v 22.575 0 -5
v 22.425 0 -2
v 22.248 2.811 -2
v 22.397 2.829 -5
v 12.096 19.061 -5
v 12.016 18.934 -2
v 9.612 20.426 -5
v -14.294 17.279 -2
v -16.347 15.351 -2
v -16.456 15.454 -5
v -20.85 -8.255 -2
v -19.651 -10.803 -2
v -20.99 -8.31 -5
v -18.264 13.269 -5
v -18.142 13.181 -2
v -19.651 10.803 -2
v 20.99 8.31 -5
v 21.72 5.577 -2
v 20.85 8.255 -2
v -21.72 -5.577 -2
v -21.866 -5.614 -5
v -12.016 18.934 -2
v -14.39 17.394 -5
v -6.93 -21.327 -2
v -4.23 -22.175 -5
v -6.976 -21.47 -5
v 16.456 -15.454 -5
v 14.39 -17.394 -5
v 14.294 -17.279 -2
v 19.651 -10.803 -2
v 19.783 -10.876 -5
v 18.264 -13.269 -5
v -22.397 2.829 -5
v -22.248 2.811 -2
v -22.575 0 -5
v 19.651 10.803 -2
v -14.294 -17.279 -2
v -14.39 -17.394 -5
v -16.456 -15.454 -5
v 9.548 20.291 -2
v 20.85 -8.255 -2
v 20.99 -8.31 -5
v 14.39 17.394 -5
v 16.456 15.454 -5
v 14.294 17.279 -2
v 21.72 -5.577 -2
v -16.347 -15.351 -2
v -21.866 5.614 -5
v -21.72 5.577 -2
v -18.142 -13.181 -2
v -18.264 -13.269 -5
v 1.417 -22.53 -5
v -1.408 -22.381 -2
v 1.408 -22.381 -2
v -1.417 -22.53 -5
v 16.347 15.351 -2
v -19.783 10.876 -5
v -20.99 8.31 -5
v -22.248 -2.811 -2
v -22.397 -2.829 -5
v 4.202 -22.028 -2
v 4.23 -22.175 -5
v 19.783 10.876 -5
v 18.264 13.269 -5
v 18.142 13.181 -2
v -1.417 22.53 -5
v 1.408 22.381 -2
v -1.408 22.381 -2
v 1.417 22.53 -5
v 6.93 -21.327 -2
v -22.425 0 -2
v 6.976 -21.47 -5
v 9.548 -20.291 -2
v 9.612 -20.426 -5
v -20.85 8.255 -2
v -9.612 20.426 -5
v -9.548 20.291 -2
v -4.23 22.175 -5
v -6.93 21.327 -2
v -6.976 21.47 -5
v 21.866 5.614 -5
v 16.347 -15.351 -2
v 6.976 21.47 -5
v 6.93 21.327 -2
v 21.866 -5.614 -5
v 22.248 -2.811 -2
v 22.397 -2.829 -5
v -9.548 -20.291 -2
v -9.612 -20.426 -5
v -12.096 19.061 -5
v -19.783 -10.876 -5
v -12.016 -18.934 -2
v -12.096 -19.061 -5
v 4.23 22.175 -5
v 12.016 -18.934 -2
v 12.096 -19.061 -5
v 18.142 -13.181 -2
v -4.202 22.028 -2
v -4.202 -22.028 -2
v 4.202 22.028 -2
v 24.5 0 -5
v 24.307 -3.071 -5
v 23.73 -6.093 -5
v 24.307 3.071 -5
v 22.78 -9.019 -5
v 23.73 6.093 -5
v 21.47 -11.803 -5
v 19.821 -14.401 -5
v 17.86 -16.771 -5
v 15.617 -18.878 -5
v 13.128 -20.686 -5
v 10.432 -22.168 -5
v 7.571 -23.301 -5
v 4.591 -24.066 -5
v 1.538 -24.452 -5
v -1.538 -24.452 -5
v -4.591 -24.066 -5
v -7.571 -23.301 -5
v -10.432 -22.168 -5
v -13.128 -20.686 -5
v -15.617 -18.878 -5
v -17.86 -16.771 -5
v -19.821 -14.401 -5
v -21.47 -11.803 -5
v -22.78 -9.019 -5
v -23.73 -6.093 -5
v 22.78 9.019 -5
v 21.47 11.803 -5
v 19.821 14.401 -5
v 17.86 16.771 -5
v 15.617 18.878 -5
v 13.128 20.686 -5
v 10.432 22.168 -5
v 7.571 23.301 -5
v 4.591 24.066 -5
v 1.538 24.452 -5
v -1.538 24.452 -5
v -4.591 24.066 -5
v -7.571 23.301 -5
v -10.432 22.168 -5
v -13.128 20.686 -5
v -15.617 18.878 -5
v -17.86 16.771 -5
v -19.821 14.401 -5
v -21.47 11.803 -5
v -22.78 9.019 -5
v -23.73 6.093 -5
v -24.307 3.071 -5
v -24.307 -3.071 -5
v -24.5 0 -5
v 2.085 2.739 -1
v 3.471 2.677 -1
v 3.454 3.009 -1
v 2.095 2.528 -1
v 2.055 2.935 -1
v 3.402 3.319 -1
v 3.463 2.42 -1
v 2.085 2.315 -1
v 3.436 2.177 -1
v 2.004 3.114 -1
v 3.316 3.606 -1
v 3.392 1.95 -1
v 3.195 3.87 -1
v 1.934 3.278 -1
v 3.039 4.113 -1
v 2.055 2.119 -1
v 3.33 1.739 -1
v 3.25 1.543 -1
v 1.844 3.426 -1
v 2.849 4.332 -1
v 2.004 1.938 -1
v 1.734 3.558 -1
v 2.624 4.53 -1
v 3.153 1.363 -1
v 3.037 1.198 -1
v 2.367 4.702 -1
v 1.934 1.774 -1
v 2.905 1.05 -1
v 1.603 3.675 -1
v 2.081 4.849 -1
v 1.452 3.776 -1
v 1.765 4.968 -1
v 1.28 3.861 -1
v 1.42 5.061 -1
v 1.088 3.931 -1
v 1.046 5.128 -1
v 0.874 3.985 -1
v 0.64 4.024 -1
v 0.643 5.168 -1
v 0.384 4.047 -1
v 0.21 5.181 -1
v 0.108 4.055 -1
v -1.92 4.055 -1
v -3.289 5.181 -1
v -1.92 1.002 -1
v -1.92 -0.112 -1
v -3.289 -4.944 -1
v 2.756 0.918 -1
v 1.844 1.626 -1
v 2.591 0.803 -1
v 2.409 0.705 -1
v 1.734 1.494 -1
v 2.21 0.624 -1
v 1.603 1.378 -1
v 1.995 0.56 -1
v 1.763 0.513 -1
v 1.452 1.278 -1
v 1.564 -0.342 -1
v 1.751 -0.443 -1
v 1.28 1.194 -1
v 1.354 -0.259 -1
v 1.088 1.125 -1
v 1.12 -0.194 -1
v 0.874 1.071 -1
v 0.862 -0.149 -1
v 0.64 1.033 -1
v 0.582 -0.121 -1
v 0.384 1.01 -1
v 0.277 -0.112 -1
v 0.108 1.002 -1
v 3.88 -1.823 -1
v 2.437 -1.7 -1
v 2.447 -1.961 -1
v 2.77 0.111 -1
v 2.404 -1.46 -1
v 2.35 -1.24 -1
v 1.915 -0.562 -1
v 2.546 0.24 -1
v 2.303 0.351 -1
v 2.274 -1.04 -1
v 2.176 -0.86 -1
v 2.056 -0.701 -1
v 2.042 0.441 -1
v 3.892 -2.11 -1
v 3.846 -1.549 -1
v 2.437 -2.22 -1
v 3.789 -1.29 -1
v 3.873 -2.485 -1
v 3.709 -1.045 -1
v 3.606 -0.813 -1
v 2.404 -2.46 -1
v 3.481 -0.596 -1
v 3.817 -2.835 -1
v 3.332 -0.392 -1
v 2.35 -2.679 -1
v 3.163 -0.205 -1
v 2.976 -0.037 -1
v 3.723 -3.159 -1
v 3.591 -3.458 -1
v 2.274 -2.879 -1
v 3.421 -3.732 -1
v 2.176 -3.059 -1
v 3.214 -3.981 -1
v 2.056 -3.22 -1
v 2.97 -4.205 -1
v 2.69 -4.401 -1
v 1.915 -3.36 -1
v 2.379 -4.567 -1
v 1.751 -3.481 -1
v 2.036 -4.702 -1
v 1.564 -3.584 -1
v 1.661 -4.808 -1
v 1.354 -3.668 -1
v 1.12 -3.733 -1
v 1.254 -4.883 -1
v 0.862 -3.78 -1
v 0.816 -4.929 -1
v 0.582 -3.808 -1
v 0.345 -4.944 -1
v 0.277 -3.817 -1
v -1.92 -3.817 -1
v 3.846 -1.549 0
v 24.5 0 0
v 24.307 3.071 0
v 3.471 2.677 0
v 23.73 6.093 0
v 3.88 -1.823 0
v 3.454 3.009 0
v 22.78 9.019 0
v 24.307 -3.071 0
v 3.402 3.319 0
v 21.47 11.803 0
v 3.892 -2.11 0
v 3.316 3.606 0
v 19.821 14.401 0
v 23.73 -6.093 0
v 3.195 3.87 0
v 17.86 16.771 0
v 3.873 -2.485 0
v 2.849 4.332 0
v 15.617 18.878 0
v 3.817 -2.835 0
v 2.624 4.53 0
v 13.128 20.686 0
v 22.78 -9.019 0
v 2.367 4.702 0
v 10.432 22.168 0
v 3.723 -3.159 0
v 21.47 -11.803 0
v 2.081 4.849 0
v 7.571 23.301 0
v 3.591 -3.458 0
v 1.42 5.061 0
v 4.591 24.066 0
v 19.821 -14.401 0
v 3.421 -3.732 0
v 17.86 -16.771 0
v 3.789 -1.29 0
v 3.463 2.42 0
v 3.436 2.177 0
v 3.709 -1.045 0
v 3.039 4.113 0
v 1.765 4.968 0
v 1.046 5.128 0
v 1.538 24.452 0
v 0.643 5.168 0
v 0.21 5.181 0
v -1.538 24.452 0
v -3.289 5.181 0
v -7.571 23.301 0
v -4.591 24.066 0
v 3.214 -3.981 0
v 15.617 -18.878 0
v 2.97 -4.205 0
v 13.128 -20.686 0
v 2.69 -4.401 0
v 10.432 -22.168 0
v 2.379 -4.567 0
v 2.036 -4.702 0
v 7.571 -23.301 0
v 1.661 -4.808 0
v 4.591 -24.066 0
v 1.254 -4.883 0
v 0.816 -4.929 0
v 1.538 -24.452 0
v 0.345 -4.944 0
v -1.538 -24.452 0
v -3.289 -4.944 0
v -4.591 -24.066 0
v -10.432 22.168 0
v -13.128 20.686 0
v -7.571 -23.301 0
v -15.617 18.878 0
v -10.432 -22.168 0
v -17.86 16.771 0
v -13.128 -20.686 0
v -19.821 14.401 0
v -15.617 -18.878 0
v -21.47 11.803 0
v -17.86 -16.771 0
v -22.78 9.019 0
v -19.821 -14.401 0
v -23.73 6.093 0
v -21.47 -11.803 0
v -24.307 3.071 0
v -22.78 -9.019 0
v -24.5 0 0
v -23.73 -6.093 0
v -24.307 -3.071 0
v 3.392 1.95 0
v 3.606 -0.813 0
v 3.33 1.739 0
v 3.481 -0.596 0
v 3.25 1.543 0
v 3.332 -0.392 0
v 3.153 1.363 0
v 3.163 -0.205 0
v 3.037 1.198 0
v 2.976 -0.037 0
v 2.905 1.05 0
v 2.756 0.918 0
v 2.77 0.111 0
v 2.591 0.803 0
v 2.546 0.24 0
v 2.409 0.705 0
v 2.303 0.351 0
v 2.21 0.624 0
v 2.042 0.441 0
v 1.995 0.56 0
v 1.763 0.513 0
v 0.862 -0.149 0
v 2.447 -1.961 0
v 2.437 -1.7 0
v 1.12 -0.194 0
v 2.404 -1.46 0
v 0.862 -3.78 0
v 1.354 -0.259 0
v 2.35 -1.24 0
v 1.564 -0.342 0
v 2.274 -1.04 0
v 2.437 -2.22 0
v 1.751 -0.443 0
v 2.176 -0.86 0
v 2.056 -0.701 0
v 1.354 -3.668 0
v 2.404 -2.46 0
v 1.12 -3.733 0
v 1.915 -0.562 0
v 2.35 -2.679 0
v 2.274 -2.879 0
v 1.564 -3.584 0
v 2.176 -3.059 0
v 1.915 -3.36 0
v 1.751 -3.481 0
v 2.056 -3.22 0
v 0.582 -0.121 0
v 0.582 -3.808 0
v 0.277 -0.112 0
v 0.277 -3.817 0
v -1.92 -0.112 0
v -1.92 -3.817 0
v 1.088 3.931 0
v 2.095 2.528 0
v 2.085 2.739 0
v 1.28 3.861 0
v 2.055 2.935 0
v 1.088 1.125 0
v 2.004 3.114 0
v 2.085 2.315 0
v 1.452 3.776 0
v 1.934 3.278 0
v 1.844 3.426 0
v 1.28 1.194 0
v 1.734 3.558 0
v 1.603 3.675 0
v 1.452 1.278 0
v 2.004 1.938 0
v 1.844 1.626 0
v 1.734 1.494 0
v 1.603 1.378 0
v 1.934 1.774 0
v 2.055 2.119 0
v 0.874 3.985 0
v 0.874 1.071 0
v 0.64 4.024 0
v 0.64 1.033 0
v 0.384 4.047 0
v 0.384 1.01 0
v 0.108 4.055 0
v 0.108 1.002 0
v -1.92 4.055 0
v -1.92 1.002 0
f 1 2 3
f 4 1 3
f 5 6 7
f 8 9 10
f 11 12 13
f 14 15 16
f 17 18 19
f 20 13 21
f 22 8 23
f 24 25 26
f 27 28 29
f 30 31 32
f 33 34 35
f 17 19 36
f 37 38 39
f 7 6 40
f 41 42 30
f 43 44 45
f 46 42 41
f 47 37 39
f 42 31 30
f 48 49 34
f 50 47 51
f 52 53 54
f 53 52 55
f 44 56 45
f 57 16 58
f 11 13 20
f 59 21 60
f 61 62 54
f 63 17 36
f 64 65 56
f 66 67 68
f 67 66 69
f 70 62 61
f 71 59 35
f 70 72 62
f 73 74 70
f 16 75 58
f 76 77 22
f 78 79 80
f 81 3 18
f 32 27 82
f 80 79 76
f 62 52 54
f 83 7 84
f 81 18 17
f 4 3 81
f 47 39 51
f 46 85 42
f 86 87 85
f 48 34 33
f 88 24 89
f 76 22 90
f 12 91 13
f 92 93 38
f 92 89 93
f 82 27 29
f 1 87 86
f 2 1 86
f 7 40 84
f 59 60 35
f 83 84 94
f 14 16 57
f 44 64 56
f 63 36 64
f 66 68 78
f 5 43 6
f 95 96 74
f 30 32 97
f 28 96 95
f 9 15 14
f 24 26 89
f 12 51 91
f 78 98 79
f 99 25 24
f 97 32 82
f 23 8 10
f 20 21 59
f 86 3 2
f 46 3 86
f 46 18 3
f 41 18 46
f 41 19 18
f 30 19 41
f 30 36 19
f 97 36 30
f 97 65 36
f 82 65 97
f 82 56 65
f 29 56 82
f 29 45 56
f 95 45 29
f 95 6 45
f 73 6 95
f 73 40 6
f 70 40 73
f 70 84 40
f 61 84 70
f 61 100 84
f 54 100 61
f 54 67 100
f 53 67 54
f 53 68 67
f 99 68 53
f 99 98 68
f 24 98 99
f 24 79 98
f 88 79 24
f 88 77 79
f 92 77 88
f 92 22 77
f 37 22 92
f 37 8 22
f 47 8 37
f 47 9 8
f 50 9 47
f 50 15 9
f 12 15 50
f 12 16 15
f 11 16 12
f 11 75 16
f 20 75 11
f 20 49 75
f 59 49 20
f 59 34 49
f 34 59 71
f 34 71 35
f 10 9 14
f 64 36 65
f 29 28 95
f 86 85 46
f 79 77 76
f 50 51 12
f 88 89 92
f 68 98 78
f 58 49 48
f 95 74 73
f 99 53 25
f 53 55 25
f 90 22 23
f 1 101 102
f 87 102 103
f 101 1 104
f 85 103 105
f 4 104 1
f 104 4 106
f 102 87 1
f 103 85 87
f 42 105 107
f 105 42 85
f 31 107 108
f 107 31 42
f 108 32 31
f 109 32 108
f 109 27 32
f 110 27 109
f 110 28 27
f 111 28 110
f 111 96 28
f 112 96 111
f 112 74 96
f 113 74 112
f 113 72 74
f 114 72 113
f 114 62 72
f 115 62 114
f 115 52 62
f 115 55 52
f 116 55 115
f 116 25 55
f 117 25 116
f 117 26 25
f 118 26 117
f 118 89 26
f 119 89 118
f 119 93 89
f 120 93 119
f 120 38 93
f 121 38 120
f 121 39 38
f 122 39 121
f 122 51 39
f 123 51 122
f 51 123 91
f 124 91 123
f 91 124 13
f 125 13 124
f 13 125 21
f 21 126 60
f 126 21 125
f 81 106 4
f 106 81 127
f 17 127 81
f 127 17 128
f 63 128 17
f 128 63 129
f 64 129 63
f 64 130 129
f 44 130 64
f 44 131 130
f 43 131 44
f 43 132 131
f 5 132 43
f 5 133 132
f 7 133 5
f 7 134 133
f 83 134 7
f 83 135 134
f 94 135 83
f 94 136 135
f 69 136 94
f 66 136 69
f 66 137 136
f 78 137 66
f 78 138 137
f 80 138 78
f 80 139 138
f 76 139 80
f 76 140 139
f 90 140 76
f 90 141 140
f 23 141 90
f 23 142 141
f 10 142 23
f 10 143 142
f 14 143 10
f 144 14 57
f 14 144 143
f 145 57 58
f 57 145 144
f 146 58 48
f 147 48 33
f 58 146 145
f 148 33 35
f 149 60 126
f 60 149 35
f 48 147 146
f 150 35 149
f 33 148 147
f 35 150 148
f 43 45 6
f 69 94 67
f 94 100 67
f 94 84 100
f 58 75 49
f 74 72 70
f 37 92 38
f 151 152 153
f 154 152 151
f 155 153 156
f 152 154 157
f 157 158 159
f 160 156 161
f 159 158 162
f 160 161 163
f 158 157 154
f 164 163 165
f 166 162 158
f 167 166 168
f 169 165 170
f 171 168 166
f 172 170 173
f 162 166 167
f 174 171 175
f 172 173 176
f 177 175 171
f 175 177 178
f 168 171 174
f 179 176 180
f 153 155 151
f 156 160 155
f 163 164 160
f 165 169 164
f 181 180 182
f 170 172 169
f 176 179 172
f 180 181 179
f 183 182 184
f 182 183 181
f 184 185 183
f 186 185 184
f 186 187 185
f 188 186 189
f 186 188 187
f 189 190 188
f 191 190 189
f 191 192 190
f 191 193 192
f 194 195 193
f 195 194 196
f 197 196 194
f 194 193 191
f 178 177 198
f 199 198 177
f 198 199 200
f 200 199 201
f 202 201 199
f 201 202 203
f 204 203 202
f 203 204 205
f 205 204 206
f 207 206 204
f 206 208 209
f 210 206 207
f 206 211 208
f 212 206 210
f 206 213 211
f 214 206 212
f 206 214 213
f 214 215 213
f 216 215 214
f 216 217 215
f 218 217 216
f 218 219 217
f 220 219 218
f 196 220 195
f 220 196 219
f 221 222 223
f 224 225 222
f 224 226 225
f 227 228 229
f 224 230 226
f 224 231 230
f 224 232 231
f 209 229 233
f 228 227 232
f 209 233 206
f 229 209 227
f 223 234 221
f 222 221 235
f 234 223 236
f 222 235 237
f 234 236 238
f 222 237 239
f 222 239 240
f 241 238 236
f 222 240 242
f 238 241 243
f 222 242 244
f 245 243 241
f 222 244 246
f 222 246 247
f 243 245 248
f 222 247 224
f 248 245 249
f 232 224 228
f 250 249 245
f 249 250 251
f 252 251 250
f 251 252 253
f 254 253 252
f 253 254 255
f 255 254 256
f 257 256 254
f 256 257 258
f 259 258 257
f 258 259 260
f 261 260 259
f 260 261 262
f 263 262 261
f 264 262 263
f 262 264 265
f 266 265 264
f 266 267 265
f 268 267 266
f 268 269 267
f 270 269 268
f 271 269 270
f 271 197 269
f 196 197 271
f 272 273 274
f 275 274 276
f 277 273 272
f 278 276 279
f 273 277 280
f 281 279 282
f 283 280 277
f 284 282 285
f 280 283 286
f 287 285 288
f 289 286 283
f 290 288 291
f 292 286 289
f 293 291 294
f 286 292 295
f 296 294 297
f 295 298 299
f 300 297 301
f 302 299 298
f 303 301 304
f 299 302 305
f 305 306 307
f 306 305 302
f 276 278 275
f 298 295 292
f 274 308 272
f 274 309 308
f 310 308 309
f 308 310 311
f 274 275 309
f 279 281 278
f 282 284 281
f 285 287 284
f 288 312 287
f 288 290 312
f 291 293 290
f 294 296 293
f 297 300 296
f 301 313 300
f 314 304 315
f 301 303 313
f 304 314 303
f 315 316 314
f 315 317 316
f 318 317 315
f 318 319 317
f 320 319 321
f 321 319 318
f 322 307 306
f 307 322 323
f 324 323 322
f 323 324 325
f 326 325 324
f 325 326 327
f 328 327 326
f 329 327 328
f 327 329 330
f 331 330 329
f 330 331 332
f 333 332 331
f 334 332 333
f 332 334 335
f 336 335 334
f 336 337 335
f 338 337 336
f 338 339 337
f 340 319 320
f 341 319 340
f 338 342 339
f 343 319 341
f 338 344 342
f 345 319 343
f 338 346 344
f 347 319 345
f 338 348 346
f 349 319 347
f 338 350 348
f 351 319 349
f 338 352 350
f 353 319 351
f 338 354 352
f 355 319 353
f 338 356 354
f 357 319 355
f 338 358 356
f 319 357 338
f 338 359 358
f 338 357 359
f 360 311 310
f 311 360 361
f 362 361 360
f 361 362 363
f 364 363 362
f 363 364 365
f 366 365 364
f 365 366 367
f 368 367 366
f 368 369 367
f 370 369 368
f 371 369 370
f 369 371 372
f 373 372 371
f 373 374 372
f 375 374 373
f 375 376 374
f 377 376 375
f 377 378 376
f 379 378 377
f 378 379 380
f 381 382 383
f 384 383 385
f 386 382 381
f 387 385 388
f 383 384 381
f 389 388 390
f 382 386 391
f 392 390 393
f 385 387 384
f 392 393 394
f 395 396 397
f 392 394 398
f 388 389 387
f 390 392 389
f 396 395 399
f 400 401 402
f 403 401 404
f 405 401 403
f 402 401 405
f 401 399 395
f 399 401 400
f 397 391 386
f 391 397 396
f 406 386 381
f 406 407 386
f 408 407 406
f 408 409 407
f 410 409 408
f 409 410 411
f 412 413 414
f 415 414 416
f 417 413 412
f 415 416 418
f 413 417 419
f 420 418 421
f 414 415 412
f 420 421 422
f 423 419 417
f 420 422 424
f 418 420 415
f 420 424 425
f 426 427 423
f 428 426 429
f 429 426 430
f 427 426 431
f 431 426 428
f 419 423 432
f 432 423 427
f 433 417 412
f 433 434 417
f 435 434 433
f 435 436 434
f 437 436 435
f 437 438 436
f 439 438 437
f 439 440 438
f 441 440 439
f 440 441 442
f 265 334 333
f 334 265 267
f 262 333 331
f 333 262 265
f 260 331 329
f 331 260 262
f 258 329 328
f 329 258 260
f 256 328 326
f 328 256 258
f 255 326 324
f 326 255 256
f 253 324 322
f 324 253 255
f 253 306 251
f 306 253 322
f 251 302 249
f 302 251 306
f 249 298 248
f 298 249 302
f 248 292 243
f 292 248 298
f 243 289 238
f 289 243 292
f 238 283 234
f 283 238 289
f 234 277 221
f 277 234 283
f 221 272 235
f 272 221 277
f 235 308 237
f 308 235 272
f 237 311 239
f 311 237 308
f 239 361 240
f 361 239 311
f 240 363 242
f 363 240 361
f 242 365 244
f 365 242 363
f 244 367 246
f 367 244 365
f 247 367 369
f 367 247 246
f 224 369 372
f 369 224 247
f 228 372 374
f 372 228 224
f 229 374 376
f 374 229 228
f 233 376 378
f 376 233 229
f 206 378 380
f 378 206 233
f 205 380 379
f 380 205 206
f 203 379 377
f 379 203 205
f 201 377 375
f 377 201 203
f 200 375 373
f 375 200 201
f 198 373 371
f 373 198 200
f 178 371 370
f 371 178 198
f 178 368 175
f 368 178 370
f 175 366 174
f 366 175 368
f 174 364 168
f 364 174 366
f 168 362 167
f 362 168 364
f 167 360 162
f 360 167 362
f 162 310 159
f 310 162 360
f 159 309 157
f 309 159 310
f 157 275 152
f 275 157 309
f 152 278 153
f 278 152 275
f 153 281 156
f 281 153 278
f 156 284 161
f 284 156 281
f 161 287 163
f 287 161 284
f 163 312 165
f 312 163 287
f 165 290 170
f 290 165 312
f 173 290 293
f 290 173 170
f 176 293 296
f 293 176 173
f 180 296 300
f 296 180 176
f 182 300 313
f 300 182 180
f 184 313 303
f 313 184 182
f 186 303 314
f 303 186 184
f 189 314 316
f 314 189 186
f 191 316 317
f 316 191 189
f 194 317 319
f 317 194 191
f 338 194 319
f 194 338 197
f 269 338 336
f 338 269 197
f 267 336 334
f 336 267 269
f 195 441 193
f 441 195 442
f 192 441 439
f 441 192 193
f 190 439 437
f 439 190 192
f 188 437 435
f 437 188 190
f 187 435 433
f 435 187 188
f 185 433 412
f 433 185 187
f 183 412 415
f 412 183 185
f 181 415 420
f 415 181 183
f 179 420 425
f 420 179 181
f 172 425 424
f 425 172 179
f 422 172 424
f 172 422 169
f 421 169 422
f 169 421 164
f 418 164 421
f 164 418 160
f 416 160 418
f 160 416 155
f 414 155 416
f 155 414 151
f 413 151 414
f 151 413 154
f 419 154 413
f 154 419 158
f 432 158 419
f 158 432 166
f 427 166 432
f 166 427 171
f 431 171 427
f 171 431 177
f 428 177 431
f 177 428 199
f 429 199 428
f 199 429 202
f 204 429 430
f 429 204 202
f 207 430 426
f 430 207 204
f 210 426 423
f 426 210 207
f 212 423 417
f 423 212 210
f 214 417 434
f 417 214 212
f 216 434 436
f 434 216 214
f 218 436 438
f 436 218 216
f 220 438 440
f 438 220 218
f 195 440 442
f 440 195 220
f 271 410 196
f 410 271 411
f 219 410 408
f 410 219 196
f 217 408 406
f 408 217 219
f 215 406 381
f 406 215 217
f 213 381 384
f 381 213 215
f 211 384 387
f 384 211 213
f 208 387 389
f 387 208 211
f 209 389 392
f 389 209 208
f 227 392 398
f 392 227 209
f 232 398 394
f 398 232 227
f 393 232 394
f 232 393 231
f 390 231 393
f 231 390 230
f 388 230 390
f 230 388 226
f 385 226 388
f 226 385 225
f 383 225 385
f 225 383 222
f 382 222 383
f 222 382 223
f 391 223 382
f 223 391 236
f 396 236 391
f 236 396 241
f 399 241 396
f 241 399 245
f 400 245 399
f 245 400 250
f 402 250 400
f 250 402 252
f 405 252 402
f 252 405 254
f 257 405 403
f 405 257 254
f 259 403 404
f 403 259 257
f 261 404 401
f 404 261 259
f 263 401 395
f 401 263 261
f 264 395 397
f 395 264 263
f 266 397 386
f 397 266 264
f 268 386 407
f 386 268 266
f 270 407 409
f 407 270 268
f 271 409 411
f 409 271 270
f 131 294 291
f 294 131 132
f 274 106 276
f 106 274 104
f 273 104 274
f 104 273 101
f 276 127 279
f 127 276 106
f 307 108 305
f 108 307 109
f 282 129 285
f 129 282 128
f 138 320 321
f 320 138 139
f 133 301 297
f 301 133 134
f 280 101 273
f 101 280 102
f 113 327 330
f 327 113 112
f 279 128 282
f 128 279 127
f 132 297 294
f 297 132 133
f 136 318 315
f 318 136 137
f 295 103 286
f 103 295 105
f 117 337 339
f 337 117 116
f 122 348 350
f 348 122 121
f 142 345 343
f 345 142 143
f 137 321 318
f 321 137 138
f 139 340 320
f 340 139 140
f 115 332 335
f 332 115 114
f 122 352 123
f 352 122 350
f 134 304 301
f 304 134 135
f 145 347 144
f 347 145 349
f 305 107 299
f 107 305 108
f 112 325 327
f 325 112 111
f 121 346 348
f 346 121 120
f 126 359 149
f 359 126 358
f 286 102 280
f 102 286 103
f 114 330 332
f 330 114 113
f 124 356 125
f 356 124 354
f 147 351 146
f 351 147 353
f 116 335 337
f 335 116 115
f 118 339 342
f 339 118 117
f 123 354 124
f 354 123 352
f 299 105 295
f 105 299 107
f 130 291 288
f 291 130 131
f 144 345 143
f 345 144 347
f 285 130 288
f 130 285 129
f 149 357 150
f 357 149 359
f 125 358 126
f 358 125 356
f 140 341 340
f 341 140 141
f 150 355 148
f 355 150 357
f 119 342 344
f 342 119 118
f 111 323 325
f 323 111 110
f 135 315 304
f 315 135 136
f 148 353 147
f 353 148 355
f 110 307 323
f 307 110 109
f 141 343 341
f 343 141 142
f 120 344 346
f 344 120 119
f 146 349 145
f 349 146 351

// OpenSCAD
$fn = 50;

difference() {
	union() {
		translate(v = [0, 0, -5.0]) {
			cylinder(h = 5, r = 24.5);
		}
	}
	union() {
		#translate(v = [0, 0, -5.0]) {
			cylinder(h = 3, r1 = 22.575, r2 = 22.425);
		}
		translate(v = [0, 0, -1]) {
			linear_extrude(height = 1) {
				text(font = "Impact", halign = "center", size = 10, text = "B", valign = "center");
			}
		}
	}
}
